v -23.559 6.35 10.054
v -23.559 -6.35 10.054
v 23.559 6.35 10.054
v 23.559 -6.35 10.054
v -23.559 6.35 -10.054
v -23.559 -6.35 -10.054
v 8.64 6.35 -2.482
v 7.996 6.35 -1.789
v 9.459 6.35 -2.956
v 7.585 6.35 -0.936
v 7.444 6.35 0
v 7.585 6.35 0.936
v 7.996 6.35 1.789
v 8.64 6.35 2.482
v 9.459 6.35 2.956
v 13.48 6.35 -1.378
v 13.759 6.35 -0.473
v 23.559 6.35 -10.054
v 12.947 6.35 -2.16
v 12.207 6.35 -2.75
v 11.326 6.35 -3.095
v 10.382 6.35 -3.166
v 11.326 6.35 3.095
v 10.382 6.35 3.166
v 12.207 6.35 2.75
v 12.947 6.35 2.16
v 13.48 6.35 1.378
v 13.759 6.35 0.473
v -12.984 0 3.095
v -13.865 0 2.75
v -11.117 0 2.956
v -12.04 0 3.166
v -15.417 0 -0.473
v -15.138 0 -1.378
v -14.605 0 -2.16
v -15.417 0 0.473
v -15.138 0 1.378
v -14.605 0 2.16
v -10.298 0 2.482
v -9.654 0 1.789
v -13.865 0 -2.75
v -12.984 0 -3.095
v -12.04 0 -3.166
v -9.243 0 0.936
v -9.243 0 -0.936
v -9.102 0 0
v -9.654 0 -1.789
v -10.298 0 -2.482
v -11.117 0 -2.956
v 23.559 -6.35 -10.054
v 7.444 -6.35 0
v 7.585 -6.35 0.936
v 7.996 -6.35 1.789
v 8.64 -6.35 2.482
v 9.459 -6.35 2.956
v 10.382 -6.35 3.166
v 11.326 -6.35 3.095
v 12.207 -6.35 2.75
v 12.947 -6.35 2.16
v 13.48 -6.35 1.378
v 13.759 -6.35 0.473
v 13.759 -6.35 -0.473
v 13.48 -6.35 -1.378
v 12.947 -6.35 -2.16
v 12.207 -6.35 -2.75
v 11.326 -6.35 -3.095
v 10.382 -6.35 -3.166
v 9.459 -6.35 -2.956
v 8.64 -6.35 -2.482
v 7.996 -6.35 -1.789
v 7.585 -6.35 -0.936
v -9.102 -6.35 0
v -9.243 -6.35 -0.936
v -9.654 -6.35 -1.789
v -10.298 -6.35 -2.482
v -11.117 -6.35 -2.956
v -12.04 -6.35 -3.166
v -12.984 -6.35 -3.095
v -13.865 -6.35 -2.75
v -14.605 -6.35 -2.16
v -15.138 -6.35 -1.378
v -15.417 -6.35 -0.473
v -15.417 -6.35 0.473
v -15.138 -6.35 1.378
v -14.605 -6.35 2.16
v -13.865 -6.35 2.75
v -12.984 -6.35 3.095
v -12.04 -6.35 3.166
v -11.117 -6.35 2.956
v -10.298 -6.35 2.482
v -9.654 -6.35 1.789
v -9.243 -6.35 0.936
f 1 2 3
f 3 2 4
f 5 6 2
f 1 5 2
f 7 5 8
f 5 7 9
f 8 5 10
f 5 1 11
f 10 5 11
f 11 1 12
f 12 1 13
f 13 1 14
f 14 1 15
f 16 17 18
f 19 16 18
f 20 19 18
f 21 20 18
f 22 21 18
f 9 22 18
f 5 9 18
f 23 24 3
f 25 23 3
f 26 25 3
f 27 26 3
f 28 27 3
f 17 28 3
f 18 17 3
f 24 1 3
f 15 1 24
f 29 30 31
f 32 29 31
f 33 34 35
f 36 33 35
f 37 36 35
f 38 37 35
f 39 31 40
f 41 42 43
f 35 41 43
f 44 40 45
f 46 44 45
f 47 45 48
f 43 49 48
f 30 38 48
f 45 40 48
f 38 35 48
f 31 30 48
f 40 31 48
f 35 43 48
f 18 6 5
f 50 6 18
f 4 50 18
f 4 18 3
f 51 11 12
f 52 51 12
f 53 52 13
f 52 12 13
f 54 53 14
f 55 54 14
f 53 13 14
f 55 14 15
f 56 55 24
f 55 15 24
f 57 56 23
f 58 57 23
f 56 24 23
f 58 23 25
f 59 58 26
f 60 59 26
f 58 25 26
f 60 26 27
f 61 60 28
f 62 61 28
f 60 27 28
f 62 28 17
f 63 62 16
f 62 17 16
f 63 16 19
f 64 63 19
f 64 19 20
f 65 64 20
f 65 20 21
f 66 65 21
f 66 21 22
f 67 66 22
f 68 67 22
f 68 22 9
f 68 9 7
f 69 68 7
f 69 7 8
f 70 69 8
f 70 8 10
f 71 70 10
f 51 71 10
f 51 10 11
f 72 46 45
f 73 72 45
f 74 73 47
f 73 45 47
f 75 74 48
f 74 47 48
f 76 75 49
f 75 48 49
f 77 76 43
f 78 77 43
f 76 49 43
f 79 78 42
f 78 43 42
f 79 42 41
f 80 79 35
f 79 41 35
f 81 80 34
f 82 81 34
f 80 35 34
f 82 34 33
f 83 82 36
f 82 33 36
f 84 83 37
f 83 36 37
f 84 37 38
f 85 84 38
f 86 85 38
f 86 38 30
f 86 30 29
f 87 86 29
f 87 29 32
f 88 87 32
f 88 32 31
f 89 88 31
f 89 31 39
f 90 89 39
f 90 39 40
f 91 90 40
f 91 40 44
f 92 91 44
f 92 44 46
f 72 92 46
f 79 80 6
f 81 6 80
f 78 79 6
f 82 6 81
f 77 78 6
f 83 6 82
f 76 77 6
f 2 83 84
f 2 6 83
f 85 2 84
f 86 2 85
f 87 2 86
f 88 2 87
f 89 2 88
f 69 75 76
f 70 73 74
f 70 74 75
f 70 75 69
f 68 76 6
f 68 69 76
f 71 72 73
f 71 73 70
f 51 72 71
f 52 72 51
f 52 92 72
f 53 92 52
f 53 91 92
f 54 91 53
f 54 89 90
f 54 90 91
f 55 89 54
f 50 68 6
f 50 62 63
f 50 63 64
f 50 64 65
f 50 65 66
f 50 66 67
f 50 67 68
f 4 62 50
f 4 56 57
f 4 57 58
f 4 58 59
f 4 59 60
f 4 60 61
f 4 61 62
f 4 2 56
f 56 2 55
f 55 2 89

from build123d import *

# Parameters (mm, degrees)
F0_W     = 47.1180379391
F0_H     = 20.1085954905
F1_DEPTH = 6.35
F2_D     = 6.35
F2_DEPTH = 6.351
F4_D     = 6.35


with BuildPart() as f1:
    # F0 (on Front) → F1 (new body, symmetric)
    with BuildSketch(Plane.XZ):
        Rectangle(F0_W, F0_H)
    extrude(amount=F1_DEPTH, both=True)

    # F2 (through all, one way)
    with BuildSketch(Plane(origin=(0, 0, 0), x_dir=(1, 0, 0), z_dir=(0, 1, 0))):
        with Locations((-12.2772194445, 0)):
            Circle(F2_D / 2)
    extrude(amount=-F2_DEPTH, mode=Mode.SUBTRACT)

    # F4 (through all)
    with Locations(Plane.XZ.offset(6.35)):
        with Locations((10.6193870306, 0)):
            Hole(F4_D / 2)


solid = f1.part
